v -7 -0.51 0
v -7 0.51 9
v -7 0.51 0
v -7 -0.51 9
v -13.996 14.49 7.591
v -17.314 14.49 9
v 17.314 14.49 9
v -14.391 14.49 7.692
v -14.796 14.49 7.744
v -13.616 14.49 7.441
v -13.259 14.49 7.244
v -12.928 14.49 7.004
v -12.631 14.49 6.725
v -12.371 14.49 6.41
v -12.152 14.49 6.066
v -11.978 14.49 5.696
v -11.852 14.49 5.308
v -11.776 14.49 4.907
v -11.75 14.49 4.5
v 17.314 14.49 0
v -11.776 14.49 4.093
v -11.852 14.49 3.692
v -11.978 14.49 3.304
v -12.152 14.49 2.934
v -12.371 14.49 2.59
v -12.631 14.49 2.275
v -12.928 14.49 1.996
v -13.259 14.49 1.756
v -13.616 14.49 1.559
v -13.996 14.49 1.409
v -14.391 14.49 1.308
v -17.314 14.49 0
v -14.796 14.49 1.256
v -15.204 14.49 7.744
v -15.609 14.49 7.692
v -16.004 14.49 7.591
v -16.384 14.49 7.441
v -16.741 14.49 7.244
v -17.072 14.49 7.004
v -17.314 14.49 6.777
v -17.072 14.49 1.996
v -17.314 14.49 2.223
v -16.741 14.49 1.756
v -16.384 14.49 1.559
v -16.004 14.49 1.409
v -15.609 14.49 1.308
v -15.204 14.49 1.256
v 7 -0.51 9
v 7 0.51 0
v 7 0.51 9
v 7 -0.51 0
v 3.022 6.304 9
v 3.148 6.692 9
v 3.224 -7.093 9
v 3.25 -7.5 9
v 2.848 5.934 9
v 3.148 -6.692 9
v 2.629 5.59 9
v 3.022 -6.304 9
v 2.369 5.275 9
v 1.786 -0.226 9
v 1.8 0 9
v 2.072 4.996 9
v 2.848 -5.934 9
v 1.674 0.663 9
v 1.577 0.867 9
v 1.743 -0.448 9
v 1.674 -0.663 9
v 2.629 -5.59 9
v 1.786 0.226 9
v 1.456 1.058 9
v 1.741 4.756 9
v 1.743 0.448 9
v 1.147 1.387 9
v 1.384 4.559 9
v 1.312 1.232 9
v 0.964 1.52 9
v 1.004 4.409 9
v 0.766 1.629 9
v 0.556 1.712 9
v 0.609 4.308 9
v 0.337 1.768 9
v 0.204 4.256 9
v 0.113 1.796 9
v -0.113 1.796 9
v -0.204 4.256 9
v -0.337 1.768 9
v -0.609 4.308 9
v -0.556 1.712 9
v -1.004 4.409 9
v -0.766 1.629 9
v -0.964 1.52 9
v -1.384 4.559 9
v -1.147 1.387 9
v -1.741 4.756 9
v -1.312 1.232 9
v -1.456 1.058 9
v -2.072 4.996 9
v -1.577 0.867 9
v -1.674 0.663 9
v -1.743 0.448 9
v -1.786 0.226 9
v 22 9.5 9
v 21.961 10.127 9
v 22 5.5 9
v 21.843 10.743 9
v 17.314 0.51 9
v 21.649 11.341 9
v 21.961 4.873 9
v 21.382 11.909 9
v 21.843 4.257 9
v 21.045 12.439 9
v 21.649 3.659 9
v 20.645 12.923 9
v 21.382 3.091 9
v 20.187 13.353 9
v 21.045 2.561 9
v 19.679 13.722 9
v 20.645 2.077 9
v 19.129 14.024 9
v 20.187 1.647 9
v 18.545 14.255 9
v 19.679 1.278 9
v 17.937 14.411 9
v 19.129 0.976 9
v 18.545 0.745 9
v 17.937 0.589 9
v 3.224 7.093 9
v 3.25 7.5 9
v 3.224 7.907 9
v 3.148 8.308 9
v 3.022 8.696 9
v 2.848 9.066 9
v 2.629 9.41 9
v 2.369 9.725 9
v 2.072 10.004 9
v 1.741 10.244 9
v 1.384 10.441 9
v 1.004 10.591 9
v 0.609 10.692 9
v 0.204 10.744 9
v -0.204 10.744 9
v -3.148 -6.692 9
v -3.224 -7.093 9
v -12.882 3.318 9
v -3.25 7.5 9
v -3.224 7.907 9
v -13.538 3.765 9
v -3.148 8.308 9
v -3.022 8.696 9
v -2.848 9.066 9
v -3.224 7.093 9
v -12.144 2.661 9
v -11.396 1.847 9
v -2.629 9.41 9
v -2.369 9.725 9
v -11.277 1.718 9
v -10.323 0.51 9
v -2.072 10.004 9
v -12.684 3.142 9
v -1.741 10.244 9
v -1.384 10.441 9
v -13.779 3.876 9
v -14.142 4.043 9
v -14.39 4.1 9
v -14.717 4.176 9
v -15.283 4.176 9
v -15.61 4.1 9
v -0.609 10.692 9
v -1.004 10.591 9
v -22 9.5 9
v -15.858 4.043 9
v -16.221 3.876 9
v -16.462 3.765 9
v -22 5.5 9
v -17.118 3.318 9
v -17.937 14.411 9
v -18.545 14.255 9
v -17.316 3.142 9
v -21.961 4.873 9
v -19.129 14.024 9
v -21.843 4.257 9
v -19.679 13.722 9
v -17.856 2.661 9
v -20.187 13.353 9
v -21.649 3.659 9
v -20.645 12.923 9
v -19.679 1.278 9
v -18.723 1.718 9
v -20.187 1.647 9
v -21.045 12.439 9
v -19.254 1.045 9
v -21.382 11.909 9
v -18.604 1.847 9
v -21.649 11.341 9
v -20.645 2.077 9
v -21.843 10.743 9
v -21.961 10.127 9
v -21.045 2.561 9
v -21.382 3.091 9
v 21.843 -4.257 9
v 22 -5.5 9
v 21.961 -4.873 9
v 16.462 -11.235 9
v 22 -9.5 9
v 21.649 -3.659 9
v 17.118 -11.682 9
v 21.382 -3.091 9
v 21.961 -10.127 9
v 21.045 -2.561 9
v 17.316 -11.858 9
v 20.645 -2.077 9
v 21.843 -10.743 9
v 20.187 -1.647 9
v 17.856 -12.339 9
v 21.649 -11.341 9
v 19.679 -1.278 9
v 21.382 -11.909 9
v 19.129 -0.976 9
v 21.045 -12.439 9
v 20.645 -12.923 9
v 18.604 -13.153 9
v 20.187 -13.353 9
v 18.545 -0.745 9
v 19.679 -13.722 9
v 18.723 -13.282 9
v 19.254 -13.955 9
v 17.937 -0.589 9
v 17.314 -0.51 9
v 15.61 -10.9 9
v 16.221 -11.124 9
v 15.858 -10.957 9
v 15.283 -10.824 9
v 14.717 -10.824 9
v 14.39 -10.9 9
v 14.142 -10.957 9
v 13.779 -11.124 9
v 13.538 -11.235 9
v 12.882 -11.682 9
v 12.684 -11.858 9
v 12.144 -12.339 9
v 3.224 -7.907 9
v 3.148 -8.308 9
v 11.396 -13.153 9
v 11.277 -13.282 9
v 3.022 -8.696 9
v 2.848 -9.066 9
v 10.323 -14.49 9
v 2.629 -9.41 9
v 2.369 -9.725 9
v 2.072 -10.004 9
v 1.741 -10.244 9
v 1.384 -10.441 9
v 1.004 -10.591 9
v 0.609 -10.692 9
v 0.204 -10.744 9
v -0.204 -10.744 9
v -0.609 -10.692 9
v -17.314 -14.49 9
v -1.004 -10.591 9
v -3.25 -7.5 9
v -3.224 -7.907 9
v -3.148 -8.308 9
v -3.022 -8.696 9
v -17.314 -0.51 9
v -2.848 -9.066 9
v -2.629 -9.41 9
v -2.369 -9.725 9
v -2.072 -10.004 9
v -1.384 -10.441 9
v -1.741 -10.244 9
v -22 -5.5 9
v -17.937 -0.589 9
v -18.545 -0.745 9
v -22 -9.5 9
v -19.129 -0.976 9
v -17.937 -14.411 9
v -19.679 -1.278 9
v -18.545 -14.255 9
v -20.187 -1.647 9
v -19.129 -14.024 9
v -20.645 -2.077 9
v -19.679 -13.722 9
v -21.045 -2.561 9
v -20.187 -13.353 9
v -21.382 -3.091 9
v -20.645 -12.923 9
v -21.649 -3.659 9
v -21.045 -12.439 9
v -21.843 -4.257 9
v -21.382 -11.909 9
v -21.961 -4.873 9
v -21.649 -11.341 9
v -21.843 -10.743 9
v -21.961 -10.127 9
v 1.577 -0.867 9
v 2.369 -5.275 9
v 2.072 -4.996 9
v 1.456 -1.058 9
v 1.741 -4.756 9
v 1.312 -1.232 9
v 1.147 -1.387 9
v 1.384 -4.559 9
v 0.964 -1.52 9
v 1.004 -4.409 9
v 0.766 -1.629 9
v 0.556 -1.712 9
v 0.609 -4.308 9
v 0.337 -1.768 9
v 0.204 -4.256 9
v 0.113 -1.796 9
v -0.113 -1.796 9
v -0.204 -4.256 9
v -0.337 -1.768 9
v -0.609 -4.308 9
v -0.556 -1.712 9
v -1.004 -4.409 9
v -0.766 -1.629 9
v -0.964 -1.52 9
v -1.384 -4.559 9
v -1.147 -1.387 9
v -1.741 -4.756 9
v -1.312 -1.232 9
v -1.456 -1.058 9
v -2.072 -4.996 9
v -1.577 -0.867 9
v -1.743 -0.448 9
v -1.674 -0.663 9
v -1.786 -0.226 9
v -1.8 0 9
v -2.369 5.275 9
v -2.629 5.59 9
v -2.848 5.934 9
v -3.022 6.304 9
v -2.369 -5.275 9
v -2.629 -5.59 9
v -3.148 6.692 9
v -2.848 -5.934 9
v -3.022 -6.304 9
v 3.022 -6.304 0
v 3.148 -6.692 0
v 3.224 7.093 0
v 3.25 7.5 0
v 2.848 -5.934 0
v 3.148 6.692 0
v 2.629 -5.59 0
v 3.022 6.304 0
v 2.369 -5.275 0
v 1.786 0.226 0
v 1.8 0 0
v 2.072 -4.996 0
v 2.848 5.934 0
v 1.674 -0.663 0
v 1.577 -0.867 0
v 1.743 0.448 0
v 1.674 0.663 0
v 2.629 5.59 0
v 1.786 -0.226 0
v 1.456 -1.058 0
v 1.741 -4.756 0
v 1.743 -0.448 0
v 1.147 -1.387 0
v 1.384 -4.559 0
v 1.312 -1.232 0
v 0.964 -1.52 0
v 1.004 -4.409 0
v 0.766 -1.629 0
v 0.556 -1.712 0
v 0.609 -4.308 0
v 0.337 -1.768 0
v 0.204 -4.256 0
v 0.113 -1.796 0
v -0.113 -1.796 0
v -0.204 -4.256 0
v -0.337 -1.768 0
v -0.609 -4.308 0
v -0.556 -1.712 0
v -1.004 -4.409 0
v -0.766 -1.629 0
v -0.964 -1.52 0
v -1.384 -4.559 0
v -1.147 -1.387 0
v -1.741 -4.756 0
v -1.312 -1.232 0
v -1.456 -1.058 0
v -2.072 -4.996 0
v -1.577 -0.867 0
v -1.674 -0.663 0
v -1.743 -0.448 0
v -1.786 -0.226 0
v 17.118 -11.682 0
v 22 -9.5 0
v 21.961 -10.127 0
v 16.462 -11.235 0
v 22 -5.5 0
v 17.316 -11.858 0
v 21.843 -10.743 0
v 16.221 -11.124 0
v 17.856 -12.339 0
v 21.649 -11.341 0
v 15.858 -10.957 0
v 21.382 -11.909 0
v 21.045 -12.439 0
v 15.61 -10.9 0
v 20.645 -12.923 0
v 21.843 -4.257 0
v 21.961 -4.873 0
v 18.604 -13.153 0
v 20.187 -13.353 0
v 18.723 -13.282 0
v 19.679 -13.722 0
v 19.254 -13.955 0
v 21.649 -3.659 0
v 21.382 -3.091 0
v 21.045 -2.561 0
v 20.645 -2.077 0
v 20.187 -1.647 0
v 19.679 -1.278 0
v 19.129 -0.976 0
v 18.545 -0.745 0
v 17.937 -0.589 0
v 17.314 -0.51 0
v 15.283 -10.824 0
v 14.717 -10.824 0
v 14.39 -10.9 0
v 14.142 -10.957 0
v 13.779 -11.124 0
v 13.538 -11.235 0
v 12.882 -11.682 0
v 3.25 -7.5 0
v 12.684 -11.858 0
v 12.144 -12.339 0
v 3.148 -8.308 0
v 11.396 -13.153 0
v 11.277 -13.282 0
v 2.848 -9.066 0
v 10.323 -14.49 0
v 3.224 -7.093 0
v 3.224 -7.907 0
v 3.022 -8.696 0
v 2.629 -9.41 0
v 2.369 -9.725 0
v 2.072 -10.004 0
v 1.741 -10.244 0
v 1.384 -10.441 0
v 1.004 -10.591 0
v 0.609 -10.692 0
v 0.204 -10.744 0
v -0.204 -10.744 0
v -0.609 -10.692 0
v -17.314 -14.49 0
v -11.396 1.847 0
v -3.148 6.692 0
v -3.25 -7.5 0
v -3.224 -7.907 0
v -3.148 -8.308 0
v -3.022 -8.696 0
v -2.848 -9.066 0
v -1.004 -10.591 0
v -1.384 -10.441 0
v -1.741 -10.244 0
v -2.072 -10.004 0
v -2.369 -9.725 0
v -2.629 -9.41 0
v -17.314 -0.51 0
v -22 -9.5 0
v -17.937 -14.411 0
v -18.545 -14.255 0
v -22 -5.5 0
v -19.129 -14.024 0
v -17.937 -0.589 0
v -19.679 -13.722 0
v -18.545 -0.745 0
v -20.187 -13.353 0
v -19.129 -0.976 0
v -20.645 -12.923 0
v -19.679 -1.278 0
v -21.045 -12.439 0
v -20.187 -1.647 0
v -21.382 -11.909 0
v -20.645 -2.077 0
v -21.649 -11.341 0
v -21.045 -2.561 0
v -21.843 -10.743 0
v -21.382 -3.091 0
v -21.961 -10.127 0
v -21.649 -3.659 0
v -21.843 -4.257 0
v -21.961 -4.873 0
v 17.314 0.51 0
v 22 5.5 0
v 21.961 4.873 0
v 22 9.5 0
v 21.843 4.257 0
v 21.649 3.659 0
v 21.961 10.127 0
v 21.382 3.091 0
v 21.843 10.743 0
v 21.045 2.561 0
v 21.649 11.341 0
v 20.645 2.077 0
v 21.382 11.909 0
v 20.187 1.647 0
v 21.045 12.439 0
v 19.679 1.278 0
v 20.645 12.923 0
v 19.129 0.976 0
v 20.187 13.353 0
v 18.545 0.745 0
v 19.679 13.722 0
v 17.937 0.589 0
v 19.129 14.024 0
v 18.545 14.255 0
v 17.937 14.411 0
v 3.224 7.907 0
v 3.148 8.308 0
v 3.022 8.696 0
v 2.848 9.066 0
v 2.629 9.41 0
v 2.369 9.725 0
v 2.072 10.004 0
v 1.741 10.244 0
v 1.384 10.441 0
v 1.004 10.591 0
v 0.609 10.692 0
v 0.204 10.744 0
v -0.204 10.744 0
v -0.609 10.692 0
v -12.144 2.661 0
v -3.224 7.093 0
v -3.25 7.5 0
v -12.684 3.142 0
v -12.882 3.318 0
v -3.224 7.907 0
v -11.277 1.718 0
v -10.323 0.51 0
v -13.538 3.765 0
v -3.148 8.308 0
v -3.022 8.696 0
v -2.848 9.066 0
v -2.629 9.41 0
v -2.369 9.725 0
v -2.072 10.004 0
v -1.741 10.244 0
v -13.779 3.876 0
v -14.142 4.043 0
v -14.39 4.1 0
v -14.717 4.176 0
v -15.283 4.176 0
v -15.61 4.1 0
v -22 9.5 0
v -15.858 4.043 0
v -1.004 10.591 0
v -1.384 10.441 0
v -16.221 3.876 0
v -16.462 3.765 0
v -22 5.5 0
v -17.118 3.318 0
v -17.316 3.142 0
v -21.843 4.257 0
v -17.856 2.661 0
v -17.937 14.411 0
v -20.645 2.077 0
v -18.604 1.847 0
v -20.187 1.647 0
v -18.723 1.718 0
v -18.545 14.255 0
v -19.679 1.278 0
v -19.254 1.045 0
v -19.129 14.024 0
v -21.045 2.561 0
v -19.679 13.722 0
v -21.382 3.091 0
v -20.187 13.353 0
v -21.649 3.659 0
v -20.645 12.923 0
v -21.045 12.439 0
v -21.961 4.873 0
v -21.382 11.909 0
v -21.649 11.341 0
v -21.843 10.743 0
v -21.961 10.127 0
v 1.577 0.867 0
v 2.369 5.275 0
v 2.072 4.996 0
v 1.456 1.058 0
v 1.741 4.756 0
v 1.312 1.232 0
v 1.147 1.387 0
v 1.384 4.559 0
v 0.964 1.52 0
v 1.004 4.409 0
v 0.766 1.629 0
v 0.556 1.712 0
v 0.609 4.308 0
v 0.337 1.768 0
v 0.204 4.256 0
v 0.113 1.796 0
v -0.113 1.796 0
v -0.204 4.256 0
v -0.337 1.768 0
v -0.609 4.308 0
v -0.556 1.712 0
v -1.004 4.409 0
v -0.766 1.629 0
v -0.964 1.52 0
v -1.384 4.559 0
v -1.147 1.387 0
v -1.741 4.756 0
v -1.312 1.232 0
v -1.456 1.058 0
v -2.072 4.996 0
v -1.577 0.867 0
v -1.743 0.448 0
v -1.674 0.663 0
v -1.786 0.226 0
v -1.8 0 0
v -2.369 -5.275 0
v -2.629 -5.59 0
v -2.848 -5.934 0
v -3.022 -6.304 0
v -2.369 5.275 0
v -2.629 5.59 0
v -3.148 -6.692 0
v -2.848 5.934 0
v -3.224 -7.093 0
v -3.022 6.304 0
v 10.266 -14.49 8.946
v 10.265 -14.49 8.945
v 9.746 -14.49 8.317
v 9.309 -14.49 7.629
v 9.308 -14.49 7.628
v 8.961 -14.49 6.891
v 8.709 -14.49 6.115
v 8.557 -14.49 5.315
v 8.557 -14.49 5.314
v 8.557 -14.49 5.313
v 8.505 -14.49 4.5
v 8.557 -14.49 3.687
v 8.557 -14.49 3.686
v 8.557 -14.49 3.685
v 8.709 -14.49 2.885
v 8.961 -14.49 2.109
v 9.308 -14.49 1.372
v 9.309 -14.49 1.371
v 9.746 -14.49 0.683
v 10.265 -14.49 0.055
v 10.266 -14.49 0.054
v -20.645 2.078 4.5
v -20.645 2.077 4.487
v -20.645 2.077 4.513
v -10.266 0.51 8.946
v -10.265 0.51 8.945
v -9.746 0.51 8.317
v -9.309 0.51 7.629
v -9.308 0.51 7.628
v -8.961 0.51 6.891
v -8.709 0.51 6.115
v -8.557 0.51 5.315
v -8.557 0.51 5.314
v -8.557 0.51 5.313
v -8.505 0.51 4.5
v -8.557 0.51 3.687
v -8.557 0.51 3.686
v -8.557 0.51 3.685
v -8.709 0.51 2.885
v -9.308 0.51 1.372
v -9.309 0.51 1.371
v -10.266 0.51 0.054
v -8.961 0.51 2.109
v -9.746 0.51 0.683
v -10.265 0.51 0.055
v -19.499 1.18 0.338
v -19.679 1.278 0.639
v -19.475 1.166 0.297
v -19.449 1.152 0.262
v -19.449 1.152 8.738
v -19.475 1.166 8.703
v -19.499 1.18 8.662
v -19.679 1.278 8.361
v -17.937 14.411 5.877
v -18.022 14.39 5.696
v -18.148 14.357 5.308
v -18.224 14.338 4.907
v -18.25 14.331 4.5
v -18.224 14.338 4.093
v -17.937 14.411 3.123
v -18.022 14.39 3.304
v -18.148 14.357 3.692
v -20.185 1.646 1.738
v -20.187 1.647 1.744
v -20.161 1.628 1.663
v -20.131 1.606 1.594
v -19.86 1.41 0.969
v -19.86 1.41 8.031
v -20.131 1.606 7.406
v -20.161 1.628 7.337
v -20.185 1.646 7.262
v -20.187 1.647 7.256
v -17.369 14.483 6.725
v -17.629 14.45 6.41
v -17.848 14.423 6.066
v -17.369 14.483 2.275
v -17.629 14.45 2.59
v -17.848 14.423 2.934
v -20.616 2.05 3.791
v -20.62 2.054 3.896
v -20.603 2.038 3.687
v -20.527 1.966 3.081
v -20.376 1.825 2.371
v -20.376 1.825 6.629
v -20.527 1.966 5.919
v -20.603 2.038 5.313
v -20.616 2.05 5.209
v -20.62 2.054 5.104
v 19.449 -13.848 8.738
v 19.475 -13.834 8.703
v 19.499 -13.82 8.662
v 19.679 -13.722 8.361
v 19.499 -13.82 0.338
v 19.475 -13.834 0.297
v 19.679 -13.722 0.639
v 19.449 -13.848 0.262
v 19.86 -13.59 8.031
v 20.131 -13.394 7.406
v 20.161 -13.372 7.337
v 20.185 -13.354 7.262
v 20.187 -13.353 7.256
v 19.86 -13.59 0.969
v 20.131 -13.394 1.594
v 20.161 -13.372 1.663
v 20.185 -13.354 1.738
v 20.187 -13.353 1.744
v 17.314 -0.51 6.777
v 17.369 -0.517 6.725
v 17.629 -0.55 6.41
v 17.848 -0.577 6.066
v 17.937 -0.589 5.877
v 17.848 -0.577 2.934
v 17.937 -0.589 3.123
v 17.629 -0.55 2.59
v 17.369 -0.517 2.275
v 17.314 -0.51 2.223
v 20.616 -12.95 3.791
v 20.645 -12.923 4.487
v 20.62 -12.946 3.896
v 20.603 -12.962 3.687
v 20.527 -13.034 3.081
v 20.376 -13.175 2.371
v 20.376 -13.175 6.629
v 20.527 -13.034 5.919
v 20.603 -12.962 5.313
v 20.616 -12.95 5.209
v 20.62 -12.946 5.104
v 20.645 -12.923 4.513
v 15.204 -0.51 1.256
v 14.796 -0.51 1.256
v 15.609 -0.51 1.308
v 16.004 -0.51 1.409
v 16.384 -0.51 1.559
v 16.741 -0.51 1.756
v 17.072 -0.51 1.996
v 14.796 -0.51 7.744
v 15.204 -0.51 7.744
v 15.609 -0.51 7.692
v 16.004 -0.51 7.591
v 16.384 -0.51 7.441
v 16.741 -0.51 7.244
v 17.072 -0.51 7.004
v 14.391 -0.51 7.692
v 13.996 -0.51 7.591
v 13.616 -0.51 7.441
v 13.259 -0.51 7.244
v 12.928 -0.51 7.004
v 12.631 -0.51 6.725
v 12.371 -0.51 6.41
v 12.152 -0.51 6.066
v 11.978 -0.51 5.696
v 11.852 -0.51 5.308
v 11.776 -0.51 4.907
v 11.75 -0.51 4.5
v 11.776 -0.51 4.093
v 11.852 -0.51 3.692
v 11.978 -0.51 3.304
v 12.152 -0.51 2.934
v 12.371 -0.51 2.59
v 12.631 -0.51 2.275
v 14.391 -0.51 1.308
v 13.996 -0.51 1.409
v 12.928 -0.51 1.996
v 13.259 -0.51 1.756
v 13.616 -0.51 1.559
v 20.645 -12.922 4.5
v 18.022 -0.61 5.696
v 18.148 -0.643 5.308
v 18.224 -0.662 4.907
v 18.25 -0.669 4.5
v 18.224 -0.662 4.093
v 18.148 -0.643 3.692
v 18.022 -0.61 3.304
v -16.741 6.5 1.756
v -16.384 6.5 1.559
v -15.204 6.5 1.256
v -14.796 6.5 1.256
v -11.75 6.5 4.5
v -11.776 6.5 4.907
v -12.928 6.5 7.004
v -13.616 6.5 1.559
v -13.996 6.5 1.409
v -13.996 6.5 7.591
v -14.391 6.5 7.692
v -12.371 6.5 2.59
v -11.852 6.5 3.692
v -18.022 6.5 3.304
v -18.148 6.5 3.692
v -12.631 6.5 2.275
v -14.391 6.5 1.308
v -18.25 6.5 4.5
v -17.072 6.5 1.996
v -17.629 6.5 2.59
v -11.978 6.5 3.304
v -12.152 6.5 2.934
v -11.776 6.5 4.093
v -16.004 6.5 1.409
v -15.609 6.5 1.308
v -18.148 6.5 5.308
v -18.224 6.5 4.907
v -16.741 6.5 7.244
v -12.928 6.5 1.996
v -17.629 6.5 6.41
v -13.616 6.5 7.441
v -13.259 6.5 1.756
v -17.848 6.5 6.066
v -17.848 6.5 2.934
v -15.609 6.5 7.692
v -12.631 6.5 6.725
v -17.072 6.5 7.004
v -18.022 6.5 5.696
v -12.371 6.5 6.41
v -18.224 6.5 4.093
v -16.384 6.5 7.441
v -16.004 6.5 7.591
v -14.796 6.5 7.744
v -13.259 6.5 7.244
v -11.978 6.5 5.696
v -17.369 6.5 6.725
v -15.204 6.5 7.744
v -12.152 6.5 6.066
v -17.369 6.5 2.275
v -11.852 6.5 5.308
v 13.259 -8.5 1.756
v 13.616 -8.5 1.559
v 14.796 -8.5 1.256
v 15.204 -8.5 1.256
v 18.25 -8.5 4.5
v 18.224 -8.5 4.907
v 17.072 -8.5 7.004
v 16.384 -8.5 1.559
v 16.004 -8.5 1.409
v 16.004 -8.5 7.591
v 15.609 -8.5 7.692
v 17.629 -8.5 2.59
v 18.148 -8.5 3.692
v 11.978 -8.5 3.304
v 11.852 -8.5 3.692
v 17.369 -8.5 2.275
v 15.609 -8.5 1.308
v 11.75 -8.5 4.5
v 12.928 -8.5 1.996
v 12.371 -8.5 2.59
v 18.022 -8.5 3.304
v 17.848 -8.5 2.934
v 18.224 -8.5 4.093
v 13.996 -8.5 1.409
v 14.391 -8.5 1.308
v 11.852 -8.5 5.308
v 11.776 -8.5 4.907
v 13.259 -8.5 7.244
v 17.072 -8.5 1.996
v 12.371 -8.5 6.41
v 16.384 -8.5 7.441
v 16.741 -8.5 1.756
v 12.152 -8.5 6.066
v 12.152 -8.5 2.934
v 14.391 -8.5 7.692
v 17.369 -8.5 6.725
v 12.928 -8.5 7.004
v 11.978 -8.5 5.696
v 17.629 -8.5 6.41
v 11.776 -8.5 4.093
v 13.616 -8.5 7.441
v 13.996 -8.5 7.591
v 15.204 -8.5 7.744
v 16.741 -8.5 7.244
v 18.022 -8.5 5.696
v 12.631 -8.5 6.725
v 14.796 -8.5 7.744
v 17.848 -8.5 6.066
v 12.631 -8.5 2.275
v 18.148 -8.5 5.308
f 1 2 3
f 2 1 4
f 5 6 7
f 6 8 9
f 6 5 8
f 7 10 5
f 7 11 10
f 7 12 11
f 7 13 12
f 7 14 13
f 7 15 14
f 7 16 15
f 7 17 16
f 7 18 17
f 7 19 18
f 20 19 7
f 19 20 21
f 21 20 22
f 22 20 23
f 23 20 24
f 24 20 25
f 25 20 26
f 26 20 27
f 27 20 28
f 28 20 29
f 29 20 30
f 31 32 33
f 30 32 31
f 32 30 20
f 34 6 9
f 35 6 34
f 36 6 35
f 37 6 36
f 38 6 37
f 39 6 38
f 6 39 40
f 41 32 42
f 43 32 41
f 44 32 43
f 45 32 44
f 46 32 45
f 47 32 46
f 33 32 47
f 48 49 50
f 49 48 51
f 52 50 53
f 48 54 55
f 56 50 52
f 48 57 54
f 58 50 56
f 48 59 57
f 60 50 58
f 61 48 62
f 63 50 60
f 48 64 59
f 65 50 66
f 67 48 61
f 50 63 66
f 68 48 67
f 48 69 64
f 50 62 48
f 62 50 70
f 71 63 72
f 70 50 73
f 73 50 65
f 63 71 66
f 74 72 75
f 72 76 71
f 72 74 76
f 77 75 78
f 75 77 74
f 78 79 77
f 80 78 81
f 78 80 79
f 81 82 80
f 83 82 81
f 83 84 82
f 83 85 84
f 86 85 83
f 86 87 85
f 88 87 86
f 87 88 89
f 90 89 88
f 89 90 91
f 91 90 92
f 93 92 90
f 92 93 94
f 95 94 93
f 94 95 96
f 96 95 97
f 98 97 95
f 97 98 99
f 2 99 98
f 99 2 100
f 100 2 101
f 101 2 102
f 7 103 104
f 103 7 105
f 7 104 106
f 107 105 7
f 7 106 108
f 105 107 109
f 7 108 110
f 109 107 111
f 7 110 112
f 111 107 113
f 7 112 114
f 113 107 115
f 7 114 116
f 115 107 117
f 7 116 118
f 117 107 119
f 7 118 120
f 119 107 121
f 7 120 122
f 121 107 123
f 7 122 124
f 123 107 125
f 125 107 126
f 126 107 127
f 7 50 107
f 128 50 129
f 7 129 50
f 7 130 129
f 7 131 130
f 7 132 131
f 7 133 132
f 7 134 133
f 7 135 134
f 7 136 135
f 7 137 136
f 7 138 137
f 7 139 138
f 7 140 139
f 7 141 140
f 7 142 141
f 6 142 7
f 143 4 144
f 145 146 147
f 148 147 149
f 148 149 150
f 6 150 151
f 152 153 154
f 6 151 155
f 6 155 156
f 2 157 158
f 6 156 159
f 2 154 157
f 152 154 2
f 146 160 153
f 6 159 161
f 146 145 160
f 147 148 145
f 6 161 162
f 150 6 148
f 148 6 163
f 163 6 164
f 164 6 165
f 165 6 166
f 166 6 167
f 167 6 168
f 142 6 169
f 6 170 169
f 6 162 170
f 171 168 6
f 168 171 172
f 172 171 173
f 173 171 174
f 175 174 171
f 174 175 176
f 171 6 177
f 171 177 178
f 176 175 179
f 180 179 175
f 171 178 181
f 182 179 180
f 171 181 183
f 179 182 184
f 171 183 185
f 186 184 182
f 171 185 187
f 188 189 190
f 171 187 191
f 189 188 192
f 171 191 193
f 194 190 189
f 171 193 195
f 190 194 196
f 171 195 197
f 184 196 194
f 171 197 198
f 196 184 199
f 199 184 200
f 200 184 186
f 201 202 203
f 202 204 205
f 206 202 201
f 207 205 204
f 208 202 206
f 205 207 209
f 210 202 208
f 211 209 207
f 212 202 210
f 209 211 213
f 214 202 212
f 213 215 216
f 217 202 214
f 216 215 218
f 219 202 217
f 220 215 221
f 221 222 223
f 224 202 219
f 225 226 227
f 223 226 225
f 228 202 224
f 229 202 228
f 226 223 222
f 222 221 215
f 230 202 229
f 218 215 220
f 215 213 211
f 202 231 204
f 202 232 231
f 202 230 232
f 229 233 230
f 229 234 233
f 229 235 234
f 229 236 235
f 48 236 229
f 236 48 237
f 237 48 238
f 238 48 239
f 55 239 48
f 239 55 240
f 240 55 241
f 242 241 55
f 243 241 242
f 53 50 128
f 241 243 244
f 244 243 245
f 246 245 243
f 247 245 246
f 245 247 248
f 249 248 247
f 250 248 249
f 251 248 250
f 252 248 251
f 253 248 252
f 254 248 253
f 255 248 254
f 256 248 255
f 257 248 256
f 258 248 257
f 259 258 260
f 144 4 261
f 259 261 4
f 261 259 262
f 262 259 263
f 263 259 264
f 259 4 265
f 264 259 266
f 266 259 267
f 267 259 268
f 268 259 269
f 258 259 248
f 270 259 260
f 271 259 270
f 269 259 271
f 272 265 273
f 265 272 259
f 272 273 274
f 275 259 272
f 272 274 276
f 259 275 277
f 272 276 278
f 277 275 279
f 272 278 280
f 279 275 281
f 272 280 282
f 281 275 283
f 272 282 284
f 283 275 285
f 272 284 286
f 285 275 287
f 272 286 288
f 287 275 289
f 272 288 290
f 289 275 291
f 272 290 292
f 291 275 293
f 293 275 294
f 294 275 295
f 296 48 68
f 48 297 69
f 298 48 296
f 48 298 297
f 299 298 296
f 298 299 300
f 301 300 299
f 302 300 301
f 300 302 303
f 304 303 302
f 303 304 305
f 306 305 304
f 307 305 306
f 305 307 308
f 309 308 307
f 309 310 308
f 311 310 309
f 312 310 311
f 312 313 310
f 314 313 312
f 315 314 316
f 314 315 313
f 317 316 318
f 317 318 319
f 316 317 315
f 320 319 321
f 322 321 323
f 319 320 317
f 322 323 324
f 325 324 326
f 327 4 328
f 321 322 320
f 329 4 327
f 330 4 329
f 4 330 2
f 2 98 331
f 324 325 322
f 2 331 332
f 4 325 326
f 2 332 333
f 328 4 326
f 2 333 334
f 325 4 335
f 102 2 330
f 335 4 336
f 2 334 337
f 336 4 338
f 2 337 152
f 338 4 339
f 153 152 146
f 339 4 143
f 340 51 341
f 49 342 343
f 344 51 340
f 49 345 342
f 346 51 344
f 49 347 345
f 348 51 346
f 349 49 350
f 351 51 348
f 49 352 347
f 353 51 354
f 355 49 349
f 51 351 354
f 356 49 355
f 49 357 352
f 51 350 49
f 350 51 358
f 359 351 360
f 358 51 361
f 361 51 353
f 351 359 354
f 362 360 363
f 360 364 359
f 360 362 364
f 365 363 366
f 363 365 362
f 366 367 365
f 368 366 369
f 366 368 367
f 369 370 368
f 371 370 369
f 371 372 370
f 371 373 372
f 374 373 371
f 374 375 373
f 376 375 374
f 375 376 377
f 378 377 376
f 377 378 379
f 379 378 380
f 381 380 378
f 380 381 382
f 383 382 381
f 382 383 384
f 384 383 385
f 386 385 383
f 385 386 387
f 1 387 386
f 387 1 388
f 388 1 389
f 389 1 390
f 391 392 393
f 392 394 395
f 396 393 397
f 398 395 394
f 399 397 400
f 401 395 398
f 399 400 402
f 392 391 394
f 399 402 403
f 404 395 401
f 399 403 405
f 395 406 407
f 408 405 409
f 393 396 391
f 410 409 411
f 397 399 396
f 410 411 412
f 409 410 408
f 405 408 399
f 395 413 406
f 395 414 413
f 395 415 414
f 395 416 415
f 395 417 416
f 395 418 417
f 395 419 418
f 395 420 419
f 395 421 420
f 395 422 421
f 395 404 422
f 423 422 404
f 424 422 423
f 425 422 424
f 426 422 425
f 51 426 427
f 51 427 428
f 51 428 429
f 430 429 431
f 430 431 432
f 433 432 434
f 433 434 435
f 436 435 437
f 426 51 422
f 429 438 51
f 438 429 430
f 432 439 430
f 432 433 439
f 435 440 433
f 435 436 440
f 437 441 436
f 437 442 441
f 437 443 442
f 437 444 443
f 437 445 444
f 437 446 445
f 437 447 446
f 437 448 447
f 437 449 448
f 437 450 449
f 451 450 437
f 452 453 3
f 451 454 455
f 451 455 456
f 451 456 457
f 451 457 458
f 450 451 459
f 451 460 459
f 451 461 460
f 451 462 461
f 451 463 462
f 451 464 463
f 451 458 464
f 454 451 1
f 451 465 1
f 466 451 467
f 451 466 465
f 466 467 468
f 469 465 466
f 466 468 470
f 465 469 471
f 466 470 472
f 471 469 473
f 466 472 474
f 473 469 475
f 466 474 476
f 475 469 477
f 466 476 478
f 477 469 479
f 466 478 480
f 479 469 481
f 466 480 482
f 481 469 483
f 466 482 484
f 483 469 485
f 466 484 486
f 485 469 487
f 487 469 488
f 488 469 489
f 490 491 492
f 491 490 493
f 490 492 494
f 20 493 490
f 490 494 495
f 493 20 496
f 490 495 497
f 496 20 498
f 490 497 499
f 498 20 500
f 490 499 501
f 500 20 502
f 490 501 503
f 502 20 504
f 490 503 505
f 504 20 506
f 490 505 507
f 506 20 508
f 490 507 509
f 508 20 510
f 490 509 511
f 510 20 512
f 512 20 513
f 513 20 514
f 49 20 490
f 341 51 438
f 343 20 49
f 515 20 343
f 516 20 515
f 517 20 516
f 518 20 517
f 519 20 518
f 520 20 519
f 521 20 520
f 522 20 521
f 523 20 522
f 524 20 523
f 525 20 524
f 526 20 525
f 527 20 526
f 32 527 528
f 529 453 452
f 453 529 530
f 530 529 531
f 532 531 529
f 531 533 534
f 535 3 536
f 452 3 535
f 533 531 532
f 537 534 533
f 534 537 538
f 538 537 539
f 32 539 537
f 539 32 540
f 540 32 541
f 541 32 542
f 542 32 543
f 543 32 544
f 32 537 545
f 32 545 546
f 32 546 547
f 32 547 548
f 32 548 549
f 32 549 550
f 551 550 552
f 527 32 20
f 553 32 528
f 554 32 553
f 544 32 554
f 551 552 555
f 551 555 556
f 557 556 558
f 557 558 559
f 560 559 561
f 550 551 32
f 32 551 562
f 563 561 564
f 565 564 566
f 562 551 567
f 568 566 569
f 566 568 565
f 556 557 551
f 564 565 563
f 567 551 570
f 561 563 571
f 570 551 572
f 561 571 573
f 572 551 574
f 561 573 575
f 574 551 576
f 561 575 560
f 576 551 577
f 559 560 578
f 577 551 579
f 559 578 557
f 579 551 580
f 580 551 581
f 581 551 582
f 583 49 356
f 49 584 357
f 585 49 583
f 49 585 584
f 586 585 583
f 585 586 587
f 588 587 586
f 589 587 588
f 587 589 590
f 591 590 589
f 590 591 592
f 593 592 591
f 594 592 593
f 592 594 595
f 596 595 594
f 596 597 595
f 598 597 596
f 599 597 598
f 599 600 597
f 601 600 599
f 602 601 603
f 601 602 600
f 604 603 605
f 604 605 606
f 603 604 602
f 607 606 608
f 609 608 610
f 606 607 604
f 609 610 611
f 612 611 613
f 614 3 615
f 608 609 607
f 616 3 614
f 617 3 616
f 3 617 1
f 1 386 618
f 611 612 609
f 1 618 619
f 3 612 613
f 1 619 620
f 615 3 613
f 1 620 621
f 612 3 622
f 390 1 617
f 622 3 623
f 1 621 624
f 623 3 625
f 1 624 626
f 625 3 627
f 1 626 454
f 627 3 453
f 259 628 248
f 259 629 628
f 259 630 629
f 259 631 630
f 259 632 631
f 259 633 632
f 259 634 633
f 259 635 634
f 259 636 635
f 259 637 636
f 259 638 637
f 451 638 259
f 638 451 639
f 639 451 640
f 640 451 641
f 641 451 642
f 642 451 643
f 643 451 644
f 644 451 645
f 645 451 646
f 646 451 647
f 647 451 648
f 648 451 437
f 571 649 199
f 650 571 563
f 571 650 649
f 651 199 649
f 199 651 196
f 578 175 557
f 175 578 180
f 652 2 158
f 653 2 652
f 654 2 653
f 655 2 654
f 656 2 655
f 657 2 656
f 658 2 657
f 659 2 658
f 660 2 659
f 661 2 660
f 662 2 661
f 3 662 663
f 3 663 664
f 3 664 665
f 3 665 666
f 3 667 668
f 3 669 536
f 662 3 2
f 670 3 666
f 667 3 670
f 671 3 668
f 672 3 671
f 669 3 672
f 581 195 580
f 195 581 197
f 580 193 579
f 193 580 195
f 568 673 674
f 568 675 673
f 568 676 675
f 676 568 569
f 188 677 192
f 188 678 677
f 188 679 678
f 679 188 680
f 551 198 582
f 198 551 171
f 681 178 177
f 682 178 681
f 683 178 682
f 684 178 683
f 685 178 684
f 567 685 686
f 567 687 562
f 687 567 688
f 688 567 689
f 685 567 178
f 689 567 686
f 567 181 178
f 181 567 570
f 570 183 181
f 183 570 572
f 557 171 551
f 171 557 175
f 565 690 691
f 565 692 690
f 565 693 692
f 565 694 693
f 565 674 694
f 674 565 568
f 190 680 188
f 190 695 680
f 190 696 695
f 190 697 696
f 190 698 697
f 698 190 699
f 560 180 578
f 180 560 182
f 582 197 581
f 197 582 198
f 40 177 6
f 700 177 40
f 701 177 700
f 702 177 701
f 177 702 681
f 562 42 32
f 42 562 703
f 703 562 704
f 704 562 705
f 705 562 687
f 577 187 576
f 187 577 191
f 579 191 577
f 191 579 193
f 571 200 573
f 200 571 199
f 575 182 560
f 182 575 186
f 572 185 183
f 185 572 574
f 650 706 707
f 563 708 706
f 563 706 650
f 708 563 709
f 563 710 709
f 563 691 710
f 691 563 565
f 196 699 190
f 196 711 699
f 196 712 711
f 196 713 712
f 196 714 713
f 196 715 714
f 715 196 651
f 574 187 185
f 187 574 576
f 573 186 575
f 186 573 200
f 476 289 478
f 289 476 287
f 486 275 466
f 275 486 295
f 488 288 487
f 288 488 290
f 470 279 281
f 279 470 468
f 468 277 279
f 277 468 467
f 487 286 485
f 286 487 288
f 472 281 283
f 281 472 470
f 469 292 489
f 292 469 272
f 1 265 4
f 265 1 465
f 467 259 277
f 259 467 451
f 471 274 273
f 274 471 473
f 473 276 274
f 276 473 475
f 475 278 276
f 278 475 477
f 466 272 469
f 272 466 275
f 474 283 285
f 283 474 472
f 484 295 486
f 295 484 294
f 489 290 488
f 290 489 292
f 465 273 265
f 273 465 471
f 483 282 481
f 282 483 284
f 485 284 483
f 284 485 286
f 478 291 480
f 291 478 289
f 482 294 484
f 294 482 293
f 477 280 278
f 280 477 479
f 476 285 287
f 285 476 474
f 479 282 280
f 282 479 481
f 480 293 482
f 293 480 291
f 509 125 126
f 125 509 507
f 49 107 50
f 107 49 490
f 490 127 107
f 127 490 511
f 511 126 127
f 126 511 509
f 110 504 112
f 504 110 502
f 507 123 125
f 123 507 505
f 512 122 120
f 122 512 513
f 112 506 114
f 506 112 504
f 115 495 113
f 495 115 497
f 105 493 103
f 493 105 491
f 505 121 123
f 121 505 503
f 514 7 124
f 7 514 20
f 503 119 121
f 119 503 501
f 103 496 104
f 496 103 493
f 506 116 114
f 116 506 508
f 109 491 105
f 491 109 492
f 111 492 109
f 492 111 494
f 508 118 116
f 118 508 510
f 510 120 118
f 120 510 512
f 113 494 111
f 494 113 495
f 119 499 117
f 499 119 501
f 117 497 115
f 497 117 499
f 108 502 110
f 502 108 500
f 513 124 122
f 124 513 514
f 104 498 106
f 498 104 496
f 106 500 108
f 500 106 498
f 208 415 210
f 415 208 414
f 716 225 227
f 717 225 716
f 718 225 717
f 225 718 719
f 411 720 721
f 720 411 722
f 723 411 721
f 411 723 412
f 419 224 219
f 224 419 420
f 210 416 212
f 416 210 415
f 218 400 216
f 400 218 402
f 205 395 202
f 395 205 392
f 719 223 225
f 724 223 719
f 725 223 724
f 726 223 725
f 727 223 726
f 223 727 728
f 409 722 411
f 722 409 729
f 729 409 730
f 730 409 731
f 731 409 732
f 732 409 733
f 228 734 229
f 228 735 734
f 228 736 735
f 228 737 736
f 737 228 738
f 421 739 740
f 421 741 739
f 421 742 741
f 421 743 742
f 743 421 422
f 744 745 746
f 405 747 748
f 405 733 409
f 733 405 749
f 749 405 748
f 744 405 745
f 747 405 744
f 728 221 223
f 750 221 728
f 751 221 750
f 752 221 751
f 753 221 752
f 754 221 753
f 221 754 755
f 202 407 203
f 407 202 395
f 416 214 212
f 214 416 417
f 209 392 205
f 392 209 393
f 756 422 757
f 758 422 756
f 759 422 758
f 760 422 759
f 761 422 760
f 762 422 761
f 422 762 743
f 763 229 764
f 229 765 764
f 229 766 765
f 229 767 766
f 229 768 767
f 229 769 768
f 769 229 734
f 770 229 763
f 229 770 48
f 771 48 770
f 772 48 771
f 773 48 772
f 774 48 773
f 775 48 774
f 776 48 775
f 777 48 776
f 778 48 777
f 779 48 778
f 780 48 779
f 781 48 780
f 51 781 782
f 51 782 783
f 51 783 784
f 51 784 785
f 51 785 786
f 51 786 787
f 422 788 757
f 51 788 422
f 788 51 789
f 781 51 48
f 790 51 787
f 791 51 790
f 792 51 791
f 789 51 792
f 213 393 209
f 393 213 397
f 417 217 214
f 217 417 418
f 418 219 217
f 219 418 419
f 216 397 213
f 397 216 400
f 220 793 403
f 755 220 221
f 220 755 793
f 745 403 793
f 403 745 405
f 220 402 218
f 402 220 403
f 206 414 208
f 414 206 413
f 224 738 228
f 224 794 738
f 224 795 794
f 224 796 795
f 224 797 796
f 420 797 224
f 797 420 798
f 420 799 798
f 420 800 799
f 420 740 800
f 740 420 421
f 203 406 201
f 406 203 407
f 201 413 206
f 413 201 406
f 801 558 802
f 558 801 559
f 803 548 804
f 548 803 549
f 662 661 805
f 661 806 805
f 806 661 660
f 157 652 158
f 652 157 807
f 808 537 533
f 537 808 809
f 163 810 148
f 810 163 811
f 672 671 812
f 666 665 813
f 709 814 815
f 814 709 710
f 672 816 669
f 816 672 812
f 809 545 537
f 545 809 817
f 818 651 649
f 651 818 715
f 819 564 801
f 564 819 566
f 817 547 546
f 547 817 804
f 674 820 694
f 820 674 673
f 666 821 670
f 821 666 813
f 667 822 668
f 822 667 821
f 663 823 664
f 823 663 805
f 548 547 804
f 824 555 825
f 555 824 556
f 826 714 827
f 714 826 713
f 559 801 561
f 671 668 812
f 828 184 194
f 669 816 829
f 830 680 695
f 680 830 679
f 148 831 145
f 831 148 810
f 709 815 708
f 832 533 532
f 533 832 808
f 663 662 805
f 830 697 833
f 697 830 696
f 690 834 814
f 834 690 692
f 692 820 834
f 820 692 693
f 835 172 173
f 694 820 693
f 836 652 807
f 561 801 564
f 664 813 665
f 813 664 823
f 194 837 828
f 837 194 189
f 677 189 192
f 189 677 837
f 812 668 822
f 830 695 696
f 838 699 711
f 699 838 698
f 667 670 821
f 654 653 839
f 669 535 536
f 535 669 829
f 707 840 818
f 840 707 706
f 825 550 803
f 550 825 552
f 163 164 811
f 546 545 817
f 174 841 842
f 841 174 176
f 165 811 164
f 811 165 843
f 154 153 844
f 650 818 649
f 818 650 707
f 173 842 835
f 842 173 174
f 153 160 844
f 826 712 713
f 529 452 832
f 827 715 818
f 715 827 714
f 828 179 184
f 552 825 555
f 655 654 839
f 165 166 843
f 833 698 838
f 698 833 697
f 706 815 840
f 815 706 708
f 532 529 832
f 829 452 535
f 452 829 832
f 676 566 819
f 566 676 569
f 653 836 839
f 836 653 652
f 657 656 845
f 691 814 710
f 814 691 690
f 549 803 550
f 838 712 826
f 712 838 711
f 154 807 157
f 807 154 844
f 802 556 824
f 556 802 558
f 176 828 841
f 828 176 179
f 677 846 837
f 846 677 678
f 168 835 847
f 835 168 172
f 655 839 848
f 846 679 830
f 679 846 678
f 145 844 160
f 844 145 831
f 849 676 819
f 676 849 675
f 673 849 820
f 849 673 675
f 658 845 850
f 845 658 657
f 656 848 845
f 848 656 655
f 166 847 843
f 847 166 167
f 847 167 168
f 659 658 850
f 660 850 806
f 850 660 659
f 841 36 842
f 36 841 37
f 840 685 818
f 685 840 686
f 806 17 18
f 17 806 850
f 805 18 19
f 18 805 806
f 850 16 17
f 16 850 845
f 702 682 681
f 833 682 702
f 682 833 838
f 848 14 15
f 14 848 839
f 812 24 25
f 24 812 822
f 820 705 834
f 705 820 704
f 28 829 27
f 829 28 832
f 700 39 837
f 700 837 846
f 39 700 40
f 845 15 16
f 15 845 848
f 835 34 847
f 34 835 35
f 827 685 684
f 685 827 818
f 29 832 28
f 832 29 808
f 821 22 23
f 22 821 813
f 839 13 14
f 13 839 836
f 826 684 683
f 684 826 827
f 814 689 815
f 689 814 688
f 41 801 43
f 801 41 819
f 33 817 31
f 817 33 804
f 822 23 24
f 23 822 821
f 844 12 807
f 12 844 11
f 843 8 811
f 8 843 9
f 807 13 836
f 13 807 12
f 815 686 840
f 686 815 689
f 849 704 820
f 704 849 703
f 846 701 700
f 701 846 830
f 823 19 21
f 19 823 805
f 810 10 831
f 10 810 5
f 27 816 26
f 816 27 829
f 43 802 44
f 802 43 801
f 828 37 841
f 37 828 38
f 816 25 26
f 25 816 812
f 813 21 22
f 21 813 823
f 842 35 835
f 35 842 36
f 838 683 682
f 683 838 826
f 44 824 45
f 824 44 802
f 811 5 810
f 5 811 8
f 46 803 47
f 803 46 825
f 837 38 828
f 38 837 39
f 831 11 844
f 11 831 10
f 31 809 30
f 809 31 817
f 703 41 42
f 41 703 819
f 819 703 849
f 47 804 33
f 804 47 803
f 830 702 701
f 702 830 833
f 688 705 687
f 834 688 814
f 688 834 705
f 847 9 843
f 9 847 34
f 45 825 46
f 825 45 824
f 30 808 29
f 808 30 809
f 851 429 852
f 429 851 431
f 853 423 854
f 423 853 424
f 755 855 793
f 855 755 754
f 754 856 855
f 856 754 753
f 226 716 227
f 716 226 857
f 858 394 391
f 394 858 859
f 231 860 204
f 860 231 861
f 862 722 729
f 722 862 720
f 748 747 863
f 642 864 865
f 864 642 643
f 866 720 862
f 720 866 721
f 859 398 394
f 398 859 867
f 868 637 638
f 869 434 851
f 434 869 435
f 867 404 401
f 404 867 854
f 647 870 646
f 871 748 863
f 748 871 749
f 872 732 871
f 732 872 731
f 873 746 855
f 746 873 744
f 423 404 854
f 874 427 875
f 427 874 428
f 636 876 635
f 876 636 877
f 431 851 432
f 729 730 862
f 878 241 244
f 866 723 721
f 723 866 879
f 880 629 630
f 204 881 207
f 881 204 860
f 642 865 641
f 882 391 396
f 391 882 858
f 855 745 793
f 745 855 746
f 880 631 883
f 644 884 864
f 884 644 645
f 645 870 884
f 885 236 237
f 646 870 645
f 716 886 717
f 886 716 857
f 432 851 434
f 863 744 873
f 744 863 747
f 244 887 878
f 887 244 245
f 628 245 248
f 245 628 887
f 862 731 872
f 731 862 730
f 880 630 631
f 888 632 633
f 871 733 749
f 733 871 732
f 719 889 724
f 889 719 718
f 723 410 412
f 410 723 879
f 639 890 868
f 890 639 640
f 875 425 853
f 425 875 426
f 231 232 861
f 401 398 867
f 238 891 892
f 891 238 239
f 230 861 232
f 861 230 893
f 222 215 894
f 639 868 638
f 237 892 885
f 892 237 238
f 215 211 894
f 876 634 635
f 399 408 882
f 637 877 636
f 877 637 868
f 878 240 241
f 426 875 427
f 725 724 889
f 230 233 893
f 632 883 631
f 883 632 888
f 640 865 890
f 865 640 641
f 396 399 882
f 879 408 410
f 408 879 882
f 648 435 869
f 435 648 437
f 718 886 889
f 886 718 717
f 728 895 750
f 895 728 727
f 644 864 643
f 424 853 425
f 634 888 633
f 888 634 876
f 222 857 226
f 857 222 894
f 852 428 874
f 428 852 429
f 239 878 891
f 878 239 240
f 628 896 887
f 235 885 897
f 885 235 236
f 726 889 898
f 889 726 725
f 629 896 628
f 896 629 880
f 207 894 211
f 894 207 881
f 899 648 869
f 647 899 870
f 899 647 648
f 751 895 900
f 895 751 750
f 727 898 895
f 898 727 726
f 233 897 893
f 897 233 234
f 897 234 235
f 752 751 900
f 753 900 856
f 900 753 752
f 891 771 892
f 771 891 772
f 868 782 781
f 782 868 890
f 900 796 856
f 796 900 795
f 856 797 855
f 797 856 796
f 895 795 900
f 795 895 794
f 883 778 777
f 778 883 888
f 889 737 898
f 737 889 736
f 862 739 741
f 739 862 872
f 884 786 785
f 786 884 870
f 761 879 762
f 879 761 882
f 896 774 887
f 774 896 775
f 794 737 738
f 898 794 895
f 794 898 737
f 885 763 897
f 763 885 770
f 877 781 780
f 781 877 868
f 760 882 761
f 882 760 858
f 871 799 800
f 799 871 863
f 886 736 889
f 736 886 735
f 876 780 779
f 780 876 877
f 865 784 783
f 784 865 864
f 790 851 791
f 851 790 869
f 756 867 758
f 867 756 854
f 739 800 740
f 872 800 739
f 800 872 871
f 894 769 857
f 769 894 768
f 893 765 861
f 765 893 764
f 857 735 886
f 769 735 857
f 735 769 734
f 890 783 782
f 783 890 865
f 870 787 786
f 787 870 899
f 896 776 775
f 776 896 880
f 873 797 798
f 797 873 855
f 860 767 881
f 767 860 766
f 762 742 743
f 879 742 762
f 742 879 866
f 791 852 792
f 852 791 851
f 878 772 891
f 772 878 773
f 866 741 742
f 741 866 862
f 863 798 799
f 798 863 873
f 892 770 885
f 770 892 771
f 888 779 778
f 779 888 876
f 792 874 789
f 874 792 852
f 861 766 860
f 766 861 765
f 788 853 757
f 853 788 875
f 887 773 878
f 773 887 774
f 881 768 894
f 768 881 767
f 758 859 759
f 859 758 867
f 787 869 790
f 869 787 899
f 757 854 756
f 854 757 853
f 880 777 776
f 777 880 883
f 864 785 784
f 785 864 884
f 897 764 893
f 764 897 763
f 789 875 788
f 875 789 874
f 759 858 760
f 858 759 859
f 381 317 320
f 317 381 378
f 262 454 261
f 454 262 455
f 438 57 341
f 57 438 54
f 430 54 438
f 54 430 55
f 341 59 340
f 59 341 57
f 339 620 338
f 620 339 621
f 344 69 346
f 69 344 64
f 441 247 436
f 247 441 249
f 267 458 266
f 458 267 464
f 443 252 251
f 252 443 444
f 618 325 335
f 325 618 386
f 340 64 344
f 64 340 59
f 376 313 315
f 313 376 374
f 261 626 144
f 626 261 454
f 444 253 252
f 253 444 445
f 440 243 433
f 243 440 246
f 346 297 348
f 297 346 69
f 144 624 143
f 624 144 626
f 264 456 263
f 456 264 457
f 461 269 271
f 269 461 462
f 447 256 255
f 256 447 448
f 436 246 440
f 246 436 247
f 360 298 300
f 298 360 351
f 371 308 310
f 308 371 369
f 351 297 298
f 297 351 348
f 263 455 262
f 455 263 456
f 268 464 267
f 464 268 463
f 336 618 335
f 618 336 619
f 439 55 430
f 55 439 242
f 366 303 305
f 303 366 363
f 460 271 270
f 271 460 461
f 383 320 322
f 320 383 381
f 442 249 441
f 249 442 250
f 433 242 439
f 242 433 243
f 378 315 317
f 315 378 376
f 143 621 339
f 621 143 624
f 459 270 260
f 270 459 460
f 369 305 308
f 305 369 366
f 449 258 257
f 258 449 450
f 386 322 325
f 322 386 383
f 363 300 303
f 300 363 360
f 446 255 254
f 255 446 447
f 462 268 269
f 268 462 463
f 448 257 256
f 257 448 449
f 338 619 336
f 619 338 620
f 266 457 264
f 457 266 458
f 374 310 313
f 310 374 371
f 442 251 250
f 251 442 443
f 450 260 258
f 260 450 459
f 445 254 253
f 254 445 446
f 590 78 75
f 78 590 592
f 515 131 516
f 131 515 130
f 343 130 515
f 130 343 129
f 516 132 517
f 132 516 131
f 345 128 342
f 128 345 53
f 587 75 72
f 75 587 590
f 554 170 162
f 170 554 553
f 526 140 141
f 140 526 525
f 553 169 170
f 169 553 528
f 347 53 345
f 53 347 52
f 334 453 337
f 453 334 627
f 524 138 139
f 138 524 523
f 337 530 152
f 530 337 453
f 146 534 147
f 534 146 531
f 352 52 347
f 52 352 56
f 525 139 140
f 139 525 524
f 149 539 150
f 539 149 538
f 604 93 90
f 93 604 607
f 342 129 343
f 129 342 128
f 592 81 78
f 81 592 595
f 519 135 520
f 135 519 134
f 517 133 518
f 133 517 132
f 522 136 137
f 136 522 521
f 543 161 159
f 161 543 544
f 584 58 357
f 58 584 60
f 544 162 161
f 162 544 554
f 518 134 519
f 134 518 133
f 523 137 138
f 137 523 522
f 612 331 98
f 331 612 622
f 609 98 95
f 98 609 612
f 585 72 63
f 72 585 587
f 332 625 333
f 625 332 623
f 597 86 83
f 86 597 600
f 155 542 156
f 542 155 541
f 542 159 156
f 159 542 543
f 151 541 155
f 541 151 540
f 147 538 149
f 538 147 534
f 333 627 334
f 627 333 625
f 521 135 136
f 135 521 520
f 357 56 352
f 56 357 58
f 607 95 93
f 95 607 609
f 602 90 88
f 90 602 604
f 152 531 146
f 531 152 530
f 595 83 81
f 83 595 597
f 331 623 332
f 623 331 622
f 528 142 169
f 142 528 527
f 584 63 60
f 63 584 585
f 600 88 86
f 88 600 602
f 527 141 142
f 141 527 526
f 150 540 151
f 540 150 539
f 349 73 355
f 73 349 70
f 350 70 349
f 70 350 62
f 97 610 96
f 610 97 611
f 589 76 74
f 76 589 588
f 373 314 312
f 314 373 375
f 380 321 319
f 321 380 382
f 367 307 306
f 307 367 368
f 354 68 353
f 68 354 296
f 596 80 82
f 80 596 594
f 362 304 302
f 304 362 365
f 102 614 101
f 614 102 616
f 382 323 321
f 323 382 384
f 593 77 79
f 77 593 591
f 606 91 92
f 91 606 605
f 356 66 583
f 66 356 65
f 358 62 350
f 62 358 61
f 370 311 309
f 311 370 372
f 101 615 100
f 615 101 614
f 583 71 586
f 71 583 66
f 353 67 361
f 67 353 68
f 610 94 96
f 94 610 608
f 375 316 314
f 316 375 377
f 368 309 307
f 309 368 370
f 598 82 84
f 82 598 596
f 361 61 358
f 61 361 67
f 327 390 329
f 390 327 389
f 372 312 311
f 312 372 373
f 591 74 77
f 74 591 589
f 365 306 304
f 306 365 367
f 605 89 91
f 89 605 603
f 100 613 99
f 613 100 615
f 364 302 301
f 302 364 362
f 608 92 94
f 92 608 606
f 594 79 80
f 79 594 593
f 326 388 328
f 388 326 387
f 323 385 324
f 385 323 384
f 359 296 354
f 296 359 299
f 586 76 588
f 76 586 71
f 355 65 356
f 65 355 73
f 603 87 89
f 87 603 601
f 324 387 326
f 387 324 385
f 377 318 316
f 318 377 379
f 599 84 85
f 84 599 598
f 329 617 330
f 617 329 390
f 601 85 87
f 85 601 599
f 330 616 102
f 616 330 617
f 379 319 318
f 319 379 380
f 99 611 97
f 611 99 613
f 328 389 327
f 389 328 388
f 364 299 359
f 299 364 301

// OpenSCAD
$fn = 50;


difference() {
	union() {
		hull() {
			translate(v = [-2.0000000000, 9.5000000000, 0]) {
				cylinder(h = 9, r = 5);
			}
			translate(v = [2.0000000000, 9.5000000000, 0]) {
				cylinder(h = 9, r = 5);
			}
			translate(v = [-2.0000000000, -9.5000000000, 0]) {
				cylinder(h = 9, r = 5);
			}
			translate(v = [2.0000000000, -9.5000000000, 0]) {
				cylinder(h = 9, r = 5);
			}
		}
		translate(v = [-7.5000000000, 7.5000000000, 0]) {
			hull() {
				translate(v = [-9.5000000000, 2.0000000000, 0]) {
					cylinder(h = 9, r = 5);
				}
				translate(v = [9.5000000000, 2.0000000000, 0]) {
					cylinder(h = 9, r = 5);
				}
				translate(v = [-9.5000000000, -2.0000000000, 0]) {
					cylinder(h = 9, r = 5);
				}
				translate(v = [9.5000000000, -2.0000000000, 0]) {
					cylinder(h = 9, r = 5);
				}
			}
		}
		translate(v = [-7.5000000000, -7.5000000000, 0]) {
			hull() {
				translate(v = [-9.5000000000, 2.0000000000, 0]) {
					cylinder(h = 9, r = 5);
				}
				translate(v = [9.5000000000, 2.0000000000, 0]) {
					cylinder(h = 9, r = 5);
				}
				translate(v = [-9.5000000000, -2.0000000000, 0]) {
					cylinder(h = 9, r = 5);
				}
				translate(v = [9.5000000000, -2.0000000000, 0]) {
					cylinder(h = 9, r = 5);
				}
			}
		}
		translate(v = [7.5000000000, 7.5000000000, 0]) {
			hull() {
				translate(v = [-9.5000000000, 2.0000000000, 0]) {
					cylinder(h = 9, r = 5);
				}
				translate(v = [9.5000000000, 2.0000000000, 0]) {
					cylinder(h = 9, r = 5);
				}
				translate(v = [-9.5000000000, -2.0000000000, 0]) {
					cylinder(h = 9, r = 5);
				}
				translate(v = [9.5000000000, -2.0000000000, 0]) {
					cylinder(h = 9, r = 5);
				}
			}
		}
		translate(v = [7.5000000000, -7.5000000000, 0]) {
			hull() {
				translate(v = [-9.5000000000, 2.0000000000, 0]) {
					cylinder(h = 9, r = 5);
				}
				translate(v = [9.5000000000, 2.0000000000, 0]) {
					cylinder(h = 9, r = 5);
				}
				translate(v = [-9.5000000000, -2.0000000000, 0]) {
					cylinder(h = 9, r = 5);
				}
				translate(v = [9.5000000000, -2.0000000000, 0]) {
					cylinder(h = 9, r = 5);
				}
			}
		}
	}
	union() {
		translate(v = [-15.0000000000, 0.5000000000, 4.5000000000]) {
			rotate(a = [90, 0, 0]) {
				difference() {
					union() {
						#translate(v = [0, 0, -14.0000000000]) {
							cylinder(h = 14, r = 2.2500000000);
						}
						#translate(v = [0, 0, -6]) {
							cylinder(h = 6, r1 = 3.2500000000, r2 = 6.5000000000);
						}
						#translate(v = [0, 0, -14.0000000000]) {
							cylinder(h = 14, r = 3.2500000000);
						}
						#translate(v = [0, 0, -14.0000000000]) {
							cylinder(h = 14, r = 2.2500000000);
						}
					}
					union();
				}
			}
		}
		translate(v = [15.0000000000, -14.5000000000, 4.5000000000]) {
			rotate(a = [90, 0, 0]) {
				difference() {
					union() {
						#translate(v = [0, 0, -14.0000000000]) {
							cylinder(h = 14, r = 2.2500000000);
						}
						#translate(v = [0, 0, -6]) {
							cylinder(h = 6, r1 = 3.2500000000, r2 = 6.5000000000);
						}
						#translate(v = [0, 0, -14.0000000000]) {
							cylinder(h = 14, r = 3.2500000000);
						}
						#translate(v = [0, 0, -14.0000000000]) {
							cylinder(h = 14, r = 2.2500000000);
						}
					}
					union();
				}
			}
		}
		translate(v = [0.0000000000, -7.5000000000, 0]) {
			translate(v = [0, 0, -100]) {
				cylinder(h = 200, r = 3.2500000000);
			}
		}
		translate(v = [0.0000000000, 7.5000000000, 0]) {
			translate(v = [0, 0, -100]) {
				cylinder(h = 200, r = 3.2500000000);
			}
		}
		translate(v = [0.0000000000, -7.5000000000, 0]) {
			translate(v = [0, 0, -100]) {
				cylinder(h = 200, r = 1.8000000000);
			}
		}
		translate(v = [0, 0, -100]) {
			cylinder(h = 200, r = 1.8000000000);
		}
		translate(v = [0.0000000000, 7.5000000000, 0]) {
			translate(v = [0, 0, -100]) {
				cylinder(h = 200, r = 1.8000000000);
			}
		}
	}
}
